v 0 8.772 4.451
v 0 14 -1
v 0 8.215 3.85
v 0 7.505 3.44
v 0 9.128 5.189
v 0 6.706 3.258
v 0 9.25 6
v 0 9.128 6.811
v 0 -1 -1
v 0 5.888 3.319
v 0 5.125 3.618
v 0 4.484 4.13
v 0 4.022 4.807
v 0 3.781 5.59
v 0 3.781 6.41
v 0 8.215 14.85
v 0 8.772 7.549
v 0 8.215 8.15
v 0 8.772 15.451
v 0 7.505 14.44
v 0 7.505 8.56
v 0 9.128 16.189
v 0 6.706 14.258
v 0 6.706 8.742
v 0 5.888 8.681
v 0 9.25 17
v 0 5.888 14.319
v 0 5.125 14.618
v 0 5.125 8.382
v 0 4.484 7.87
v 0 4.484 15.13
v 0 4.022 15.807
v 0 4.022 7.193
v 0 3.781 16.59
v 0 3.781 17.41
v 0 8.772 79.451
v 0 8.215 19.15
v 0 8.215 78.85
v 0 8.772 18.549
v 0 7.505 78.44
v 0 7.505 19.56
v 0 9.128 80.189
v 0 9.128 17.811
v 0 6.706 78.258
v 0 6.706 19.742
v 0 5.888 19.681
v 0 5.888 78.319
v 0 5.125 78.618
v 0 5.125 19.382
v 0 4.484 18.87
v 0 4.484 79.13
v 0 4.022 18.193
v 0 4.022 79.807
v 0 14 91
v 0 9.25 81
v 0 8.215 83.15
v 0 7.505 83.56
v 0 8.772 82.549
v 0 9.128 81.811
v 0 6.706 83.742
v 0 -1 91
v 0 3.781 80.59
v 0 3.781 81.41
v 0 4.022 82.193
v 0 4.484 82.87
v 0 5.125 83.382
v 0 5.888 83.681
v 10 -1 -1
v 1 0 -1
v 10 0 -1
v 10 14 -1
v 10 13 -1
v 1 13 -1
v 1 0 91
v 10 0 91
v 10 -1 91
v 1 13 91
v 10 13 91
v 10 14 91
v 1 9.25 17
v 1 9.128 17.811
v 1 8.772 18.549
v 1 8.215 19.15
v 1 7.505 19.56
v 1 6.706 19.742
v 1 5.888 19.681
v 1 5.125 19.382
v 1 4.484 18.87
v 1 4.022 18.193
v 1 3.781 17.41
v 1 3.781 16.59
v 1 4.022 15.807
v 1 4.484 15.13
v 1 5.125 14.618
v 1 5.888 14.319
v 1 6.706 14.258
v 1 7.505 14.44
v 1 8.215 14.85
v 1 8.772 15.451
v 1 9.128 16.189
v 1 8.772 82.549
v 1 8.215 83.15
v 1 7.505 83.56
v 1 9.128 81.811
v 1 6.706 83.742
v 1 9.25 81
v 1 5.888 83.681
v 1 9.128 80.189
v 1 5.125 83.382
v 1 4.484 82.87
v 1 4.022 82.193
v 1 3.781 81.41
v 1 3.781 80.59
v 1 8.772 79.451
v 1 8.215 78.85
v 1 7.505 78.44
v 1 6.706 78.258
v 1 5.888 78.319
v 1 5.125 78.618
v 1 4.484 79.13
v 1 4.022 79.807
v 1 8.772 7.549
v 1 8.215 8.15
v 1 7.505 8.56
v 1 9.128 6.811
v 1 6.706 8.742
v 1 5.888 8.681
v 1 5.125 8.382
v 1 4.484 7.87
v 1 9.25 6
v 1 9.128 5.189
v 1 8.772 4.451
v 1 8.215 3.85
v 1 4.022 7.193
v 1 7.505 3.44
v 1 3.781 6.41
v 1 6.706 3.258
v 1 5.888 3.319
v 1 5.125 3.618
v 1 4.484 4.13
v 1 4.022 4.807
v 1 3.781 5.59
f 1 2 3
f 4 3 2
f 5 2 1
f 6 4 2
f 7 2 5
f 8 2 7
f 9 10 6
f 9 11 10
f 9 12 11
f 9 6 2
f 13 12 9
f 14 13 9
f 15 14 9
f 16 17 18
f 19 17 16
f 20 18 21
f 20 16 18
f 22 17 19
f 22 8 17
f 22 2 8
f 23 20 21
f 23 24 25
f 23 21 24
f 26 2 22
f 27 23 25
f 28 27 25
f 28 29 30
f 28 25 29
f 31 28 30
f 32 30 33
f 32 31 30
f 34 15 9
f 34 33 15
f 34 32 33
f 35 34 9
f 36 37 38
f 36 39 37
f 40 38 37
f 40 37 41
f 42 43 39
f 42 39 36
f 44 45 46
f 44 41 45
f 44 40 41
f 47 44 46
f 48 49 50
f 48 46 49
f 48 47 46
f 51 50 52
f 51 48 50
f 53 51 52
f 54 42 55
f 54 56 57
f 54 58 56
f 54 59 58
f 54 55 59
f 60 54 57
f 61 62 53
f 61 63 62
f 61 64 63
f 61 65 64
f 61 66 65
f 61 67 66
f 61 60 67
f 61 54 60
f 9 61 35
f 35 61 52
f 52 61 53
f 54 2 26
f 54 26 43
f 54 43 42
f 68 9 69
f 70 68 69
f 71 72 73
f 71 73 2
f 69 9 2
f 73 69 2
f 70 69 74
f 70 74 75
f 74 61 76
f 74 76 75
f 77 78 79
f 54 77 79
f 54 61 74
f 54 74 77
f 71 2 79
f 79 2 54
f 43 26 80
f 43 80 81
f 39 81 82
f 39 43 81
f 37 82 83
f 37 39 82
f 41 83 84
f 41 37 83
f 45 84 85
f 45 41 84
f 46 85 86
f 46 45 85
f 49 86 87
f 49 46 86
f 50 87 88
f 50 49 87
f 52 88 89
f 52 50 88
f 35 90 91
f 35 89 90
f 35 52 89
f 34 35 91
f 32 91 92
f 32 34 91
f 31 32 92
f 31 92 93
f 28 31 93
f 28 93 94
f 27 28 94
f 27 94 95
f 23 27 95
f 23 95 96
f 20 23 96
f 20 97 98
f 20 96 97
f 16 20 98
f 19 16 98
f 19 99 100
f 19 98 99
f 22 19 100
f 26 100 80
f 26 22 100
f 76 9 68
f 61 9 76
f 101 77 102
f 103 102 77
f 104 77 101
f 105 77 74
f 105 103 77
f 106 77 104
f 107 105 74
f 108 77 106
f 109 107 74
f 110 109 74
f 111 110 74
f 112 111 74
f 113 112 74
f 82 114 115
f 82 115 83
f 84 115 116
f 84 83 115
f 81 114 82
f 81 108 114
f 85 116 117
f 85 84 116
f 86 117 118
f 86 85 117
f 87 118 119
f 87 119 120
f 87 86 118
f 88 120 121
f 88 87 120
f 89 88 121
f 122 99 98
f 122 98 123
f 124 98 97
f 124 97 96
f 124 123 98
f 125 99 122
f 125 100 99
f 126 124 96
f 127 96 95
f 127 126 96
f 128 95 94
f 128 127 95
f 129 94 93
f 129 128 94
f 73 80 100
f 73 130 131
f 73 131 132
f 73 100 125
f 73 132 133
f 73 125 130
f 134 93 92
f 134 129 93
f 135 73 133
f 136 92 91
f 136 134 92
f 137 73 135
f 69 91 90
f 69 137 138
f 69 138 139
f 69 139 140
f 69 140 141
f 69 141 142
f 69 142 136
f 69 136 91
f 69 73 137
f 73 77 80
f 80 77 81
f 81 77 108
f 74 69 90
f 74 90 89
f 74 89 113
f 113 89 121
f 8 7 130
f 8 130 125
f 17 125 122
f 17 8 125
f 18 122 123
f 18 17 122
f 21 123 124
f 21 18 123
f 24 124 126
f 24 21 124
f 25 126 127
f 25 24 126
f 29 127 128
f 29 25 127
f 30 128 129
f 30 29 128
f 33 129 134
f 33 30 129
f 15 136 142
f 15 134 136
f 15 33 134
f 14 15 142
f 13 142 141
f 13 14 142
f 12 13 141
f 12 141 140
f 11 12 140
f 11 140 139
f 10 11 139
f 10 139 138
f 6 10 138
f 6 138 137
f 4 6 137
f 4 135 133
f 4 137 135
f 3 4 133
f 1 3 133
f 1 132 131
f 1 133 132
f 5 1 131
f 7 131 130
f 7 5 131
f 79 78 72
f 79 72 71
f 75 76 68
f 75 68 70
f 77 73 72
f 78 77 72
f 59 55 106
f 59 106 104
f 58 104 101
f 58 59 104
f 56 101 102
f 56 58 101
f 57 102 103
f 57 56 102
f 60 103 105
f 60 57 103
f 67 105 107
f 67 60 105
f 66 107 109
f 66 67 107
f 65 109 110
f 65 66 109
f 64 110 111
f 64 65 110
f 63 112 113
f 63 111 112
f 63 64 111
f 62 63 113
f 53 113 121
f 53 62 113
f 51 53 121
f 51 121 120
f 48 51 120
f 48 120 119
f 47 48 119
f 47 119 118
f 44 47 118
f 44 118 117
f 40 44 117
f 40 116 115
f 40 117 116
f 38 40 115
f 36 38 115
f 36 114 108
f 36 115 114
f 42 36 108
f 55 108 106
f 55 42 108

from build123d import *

# Parameters (mm, degrees)
CROQUIS1_W                 = 15
CROQUIS1_H                 = 92
CROQUIS1_W_2               = 13
CROQUIS1_H_2               = 90
EXTRUIR_L_MINA1_DEPTH      = 10
CROQUIS2_W                 = 9
CROQUIS2_H                 = 13
CORTAR_EXTRUIR2_DEPTH      = 94.594871654
CROQUIS5_W                 = 13
CROQUIS5_H                 = 90
SALIENTE_EXTRUIR1_DEPTH    = 1
CORTAR_EXTRUIR3_DEPTH      = 93.509458976
CORTAR_EXTRUIR3_DEPTH_BACK = 93.509458976
CROQUIS6_R                 = 2.75


with BuildPart() as part:
    # Croquis1 → Extruir-Lámina1 (new body)
    with BuildSketch(Plane.YZ):
        with Locations((6.5, 45)):
            Rectangle(CROQUIS1_W, CROQUIS1_H)
        with Locations((6.5, 45)):
            Rectangle(CROQUIS1_W_2, CROQUIS1_H_2, mode=Mode.SUBTRACT)
    extrude(amount=EXTRUIR_L_MINA1_DEPTH)

    # Croquis2 → Cortar-Extruir2 (cut, through all)
    with BuildSketch(Plane(origin=(0, 0, -1), x_dir=(1, 0, 0), z_dir=(0, 0, -1))):
        with Locations((5.5, -6.5)):
            Rectangle(CROQUIS2_W, CROQUIS2_H)
    extrude(amount=-CORTAR_EXTRUIR2_DEPTH, mode=Mode.SUBTRACT)

    # Croquis5 → Saliente-Extruir1 (add)
    with BuildSketch(Plane(origin=(0, 0, 0), x_dir=(0, -1, 0), z_dir=(-1, 0, 0))):
        with Locations((-6.5, 45)):
            Rectangle(CROQUIS5_W, CROQUIS5_H)
    extrude(amount=-SALIENTE_EXTRUIR1_DEPTH)

    # Croquis6 → Cortar-Extruir3 (cut, two sides: drawn at the far end of the back side and taken through both)
    with BuildSketch(Plane.YZ.offset(1).offset(-CORTAR_EXTRUIR3_DEPTH_BACK)):
        with Locations((6.5, 17)):
            Circle(CROQUIS6_R)
        with Locations((6.5, 81)):
            Circle(CROQUIS6_R)
        with Locations((6.5, 6)):
            Circle(CROQUIS6_R)
    extrude(amount=CORTAR_EXTRUIR3_DEPTH + CORTAR_EXTRUIR3_DEPTH_BACK, mode=Mode.SUBTRACT)


solid = part.part
